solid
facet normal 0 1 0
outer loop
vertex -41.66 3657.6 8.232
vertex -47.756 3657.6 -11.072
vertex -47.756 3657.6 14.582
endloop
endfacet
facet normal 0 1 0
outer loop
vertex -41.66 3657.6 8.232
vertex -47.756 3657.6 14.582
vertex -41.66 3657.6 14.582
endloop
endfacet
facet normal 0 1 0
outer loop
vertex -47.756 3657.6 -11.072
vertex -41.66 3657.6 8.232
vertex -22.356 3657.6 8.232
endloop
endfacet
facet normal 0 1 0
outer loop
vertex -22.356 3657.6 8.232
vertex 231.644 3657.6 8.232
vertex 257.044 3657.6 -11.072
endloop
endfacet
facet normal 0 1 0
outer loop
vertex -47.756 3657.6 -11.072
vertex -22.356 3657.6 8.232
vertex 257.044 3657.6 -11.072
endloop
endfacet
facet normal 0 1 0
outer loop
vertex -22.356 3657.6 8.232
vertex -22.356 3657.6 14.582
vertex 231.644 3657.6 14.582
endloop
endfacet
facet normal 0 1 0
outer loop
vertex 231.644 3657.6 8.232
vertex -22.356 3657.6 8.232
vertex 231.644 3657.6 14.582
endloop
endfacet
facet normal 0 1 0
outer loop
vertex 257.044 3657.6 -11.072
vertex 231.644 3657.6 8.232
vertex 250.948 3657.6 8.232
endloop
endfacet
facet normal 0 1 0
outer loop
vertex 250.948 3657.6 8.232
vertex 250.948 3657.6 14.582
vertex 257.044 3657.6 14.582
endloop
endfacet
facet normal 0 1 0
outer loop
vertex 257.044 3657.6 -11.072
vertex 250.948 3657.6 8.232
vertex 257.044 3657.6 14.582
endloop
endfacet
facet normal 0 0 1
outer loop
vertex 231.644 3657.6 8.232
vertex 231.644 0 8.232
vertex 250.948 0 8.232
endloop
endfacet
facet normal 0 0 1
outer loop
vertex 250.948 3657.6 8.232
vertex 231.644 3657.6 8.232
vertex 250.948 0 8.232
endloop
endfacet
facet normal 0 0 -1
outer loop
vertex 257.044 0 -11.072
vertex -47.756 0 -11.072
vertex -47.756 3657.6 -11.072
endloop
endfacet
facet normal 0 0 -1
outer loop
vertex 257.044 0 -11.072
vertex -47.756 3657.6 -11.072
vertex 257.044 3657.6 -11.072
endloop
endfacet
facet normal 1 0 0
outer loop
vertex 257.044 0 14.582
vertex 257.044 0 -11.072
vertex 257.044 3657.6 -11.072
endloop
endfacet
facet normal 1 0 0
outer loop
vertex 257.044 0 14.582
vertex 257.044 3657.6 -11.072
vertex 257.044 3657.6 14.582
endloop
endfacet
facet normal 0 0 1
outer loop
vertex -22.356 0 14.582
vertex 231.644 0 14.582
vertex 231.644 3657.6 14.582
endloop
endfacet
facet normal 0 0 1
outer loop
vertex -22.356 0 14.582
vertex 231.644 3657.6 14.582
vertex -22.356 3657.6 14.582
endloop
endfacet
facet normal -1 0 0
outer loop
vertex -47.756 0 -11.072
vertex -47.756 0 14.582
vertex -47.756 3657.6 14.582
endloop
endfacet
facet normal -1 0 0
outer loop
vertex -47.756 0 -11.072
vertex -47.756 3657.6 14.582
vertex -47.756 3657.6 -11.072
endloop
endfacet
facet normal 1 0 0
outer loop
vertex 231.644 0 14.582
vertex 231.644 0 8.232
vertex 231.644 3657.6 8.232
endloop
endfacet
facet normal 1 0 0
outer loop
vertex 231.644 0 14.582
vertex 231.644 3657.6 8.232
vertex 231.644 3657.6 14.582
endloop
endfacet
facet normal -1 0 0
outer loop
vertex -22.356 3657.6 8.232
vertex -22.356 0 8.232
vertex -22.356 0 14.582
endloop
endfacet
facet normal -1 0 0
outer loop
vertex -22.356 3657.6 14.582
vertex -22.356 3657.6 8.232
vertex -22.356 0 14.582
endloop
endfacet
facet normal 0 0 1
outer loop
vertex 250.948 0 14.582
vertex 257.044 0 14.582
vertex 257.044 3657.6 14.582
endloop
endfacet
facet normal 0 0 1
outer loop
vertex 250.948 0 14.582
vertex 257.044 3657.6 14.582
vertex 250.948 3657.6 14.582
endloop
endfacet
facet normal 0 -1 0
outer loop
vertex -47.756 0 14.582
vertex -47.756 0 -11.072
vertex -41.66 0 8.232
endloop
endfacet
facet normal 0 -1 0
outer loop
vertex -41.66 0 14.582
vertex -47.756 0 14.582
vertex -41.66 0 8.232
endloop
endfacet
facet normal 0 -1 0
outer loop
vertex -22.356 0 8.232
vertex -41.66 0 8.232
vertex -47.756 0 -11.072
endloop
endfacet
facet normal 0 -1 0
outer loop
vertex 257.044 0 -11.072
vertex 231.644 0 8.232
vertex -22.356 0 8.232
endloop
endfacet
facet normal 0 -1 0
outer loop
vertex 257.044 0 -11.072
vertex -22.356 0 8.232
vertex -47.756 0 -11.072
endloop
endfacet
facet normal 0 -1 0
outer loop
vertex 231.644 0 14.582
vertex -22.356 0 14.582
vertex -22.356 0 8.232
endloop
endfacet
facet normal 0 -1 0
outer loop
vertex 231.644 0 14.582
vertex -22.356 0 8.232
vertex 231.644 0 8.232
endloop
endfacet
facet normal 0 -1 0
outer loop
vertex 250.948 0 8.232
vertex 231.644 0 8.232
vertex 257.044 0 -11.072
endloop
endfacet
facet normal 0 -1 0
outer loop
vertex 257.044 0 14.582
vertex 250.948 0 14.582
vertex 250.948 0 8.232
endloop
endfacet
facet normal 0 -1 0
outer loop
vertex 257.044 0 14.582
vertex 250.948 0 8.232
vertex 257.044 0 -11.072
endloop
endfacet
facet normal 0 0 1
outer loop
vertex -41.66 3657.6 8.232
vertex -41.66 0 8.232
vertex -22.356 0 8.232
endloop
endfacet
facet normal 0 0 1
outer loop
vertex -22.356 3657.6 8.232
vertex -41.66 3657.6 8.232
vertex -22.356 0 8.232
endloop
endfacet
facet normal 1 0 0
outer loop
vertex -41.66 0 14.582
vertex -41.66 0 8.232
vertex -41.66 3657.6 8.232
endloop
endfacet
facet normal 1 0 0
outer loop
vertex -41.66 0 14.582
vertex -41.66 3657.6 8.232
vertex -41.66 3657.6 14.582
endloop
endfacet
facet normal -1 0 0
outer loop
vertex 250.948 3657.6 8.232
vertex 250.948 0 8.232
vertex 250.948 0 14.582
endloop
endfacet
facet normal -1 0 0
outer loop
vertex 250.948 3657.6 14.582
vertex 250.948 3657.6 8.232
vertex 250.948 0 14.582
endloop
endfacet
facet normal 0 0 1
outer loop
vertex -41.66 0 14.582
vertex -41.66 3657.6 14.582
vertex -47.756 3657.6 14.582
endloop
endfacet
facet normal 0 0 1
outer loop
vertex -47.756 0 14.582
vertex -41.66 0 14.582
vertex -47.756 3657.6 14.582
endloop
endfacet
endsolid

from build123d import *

# Parameters (mm, degrees)
F0_W     = 19.304
F0_H     = 6.35
F0_H_2   = 19.304
F1_DEPTH = 3657.6
F2_W     = 19.304
F2_H     = 6.35
F3_DEPTH = 3657.601


with BuildPart() as f1:
    # F0 (on Front) → F1 (new body)
    with BuildSketch(Plane.XZ):
        Polygon((-41.66015, 14.582246), (-47.75615, 14.582246), (-47.75615, -11.071754), (-41.66015, -11.071754), (-41.66015, 8.232246), align=None)
        with Locations((-32.00815, 11.407246)):
            Rectangle(F0_W, F0_H)
        Polygon((231.64385, 14.582246), (-22.35615, 14.582246), (-22.35615, 8.232246), (-22.35615, -11.071754), (231.64385, -11.071754), (231.64385, 8.232246), align=None)
        with Locations((-32.00815, -1.419754)):
            Rectangle(F0_W, F0_H_2)
        with Locations((241.29585, 11.407246)):
            Rectangle(F0_W, F0_H)
        Polygon((257.04385, 14.582246), (250.94785, 14.582246), (250.94785, 8.232246), (250.94785, -11.071754), (257.04385, -11.071754), align=None)
        with Locations((241.29585, -1.419754)):
            Rectangle(F0_W, F0_H_2)
    extrude(amount=-F1_DEPTH)

    # F2 (on face) + F0 (on Front) → F3 (cut, through all)
    with BuildSketch(Plane.XZ):
        with Locations((-32.00815, 11.407246)):
            Rectangle(F2_W, F2_H)
    with BuildSketch(Plane.XZ):
        with Locations((241.29585, 11.407246)):
            Rectangle(F0_W, F0_H)
    extrude(amount=-F3_DEPTH, mode=Mode.SUBTRACT)


solid = f1.part
